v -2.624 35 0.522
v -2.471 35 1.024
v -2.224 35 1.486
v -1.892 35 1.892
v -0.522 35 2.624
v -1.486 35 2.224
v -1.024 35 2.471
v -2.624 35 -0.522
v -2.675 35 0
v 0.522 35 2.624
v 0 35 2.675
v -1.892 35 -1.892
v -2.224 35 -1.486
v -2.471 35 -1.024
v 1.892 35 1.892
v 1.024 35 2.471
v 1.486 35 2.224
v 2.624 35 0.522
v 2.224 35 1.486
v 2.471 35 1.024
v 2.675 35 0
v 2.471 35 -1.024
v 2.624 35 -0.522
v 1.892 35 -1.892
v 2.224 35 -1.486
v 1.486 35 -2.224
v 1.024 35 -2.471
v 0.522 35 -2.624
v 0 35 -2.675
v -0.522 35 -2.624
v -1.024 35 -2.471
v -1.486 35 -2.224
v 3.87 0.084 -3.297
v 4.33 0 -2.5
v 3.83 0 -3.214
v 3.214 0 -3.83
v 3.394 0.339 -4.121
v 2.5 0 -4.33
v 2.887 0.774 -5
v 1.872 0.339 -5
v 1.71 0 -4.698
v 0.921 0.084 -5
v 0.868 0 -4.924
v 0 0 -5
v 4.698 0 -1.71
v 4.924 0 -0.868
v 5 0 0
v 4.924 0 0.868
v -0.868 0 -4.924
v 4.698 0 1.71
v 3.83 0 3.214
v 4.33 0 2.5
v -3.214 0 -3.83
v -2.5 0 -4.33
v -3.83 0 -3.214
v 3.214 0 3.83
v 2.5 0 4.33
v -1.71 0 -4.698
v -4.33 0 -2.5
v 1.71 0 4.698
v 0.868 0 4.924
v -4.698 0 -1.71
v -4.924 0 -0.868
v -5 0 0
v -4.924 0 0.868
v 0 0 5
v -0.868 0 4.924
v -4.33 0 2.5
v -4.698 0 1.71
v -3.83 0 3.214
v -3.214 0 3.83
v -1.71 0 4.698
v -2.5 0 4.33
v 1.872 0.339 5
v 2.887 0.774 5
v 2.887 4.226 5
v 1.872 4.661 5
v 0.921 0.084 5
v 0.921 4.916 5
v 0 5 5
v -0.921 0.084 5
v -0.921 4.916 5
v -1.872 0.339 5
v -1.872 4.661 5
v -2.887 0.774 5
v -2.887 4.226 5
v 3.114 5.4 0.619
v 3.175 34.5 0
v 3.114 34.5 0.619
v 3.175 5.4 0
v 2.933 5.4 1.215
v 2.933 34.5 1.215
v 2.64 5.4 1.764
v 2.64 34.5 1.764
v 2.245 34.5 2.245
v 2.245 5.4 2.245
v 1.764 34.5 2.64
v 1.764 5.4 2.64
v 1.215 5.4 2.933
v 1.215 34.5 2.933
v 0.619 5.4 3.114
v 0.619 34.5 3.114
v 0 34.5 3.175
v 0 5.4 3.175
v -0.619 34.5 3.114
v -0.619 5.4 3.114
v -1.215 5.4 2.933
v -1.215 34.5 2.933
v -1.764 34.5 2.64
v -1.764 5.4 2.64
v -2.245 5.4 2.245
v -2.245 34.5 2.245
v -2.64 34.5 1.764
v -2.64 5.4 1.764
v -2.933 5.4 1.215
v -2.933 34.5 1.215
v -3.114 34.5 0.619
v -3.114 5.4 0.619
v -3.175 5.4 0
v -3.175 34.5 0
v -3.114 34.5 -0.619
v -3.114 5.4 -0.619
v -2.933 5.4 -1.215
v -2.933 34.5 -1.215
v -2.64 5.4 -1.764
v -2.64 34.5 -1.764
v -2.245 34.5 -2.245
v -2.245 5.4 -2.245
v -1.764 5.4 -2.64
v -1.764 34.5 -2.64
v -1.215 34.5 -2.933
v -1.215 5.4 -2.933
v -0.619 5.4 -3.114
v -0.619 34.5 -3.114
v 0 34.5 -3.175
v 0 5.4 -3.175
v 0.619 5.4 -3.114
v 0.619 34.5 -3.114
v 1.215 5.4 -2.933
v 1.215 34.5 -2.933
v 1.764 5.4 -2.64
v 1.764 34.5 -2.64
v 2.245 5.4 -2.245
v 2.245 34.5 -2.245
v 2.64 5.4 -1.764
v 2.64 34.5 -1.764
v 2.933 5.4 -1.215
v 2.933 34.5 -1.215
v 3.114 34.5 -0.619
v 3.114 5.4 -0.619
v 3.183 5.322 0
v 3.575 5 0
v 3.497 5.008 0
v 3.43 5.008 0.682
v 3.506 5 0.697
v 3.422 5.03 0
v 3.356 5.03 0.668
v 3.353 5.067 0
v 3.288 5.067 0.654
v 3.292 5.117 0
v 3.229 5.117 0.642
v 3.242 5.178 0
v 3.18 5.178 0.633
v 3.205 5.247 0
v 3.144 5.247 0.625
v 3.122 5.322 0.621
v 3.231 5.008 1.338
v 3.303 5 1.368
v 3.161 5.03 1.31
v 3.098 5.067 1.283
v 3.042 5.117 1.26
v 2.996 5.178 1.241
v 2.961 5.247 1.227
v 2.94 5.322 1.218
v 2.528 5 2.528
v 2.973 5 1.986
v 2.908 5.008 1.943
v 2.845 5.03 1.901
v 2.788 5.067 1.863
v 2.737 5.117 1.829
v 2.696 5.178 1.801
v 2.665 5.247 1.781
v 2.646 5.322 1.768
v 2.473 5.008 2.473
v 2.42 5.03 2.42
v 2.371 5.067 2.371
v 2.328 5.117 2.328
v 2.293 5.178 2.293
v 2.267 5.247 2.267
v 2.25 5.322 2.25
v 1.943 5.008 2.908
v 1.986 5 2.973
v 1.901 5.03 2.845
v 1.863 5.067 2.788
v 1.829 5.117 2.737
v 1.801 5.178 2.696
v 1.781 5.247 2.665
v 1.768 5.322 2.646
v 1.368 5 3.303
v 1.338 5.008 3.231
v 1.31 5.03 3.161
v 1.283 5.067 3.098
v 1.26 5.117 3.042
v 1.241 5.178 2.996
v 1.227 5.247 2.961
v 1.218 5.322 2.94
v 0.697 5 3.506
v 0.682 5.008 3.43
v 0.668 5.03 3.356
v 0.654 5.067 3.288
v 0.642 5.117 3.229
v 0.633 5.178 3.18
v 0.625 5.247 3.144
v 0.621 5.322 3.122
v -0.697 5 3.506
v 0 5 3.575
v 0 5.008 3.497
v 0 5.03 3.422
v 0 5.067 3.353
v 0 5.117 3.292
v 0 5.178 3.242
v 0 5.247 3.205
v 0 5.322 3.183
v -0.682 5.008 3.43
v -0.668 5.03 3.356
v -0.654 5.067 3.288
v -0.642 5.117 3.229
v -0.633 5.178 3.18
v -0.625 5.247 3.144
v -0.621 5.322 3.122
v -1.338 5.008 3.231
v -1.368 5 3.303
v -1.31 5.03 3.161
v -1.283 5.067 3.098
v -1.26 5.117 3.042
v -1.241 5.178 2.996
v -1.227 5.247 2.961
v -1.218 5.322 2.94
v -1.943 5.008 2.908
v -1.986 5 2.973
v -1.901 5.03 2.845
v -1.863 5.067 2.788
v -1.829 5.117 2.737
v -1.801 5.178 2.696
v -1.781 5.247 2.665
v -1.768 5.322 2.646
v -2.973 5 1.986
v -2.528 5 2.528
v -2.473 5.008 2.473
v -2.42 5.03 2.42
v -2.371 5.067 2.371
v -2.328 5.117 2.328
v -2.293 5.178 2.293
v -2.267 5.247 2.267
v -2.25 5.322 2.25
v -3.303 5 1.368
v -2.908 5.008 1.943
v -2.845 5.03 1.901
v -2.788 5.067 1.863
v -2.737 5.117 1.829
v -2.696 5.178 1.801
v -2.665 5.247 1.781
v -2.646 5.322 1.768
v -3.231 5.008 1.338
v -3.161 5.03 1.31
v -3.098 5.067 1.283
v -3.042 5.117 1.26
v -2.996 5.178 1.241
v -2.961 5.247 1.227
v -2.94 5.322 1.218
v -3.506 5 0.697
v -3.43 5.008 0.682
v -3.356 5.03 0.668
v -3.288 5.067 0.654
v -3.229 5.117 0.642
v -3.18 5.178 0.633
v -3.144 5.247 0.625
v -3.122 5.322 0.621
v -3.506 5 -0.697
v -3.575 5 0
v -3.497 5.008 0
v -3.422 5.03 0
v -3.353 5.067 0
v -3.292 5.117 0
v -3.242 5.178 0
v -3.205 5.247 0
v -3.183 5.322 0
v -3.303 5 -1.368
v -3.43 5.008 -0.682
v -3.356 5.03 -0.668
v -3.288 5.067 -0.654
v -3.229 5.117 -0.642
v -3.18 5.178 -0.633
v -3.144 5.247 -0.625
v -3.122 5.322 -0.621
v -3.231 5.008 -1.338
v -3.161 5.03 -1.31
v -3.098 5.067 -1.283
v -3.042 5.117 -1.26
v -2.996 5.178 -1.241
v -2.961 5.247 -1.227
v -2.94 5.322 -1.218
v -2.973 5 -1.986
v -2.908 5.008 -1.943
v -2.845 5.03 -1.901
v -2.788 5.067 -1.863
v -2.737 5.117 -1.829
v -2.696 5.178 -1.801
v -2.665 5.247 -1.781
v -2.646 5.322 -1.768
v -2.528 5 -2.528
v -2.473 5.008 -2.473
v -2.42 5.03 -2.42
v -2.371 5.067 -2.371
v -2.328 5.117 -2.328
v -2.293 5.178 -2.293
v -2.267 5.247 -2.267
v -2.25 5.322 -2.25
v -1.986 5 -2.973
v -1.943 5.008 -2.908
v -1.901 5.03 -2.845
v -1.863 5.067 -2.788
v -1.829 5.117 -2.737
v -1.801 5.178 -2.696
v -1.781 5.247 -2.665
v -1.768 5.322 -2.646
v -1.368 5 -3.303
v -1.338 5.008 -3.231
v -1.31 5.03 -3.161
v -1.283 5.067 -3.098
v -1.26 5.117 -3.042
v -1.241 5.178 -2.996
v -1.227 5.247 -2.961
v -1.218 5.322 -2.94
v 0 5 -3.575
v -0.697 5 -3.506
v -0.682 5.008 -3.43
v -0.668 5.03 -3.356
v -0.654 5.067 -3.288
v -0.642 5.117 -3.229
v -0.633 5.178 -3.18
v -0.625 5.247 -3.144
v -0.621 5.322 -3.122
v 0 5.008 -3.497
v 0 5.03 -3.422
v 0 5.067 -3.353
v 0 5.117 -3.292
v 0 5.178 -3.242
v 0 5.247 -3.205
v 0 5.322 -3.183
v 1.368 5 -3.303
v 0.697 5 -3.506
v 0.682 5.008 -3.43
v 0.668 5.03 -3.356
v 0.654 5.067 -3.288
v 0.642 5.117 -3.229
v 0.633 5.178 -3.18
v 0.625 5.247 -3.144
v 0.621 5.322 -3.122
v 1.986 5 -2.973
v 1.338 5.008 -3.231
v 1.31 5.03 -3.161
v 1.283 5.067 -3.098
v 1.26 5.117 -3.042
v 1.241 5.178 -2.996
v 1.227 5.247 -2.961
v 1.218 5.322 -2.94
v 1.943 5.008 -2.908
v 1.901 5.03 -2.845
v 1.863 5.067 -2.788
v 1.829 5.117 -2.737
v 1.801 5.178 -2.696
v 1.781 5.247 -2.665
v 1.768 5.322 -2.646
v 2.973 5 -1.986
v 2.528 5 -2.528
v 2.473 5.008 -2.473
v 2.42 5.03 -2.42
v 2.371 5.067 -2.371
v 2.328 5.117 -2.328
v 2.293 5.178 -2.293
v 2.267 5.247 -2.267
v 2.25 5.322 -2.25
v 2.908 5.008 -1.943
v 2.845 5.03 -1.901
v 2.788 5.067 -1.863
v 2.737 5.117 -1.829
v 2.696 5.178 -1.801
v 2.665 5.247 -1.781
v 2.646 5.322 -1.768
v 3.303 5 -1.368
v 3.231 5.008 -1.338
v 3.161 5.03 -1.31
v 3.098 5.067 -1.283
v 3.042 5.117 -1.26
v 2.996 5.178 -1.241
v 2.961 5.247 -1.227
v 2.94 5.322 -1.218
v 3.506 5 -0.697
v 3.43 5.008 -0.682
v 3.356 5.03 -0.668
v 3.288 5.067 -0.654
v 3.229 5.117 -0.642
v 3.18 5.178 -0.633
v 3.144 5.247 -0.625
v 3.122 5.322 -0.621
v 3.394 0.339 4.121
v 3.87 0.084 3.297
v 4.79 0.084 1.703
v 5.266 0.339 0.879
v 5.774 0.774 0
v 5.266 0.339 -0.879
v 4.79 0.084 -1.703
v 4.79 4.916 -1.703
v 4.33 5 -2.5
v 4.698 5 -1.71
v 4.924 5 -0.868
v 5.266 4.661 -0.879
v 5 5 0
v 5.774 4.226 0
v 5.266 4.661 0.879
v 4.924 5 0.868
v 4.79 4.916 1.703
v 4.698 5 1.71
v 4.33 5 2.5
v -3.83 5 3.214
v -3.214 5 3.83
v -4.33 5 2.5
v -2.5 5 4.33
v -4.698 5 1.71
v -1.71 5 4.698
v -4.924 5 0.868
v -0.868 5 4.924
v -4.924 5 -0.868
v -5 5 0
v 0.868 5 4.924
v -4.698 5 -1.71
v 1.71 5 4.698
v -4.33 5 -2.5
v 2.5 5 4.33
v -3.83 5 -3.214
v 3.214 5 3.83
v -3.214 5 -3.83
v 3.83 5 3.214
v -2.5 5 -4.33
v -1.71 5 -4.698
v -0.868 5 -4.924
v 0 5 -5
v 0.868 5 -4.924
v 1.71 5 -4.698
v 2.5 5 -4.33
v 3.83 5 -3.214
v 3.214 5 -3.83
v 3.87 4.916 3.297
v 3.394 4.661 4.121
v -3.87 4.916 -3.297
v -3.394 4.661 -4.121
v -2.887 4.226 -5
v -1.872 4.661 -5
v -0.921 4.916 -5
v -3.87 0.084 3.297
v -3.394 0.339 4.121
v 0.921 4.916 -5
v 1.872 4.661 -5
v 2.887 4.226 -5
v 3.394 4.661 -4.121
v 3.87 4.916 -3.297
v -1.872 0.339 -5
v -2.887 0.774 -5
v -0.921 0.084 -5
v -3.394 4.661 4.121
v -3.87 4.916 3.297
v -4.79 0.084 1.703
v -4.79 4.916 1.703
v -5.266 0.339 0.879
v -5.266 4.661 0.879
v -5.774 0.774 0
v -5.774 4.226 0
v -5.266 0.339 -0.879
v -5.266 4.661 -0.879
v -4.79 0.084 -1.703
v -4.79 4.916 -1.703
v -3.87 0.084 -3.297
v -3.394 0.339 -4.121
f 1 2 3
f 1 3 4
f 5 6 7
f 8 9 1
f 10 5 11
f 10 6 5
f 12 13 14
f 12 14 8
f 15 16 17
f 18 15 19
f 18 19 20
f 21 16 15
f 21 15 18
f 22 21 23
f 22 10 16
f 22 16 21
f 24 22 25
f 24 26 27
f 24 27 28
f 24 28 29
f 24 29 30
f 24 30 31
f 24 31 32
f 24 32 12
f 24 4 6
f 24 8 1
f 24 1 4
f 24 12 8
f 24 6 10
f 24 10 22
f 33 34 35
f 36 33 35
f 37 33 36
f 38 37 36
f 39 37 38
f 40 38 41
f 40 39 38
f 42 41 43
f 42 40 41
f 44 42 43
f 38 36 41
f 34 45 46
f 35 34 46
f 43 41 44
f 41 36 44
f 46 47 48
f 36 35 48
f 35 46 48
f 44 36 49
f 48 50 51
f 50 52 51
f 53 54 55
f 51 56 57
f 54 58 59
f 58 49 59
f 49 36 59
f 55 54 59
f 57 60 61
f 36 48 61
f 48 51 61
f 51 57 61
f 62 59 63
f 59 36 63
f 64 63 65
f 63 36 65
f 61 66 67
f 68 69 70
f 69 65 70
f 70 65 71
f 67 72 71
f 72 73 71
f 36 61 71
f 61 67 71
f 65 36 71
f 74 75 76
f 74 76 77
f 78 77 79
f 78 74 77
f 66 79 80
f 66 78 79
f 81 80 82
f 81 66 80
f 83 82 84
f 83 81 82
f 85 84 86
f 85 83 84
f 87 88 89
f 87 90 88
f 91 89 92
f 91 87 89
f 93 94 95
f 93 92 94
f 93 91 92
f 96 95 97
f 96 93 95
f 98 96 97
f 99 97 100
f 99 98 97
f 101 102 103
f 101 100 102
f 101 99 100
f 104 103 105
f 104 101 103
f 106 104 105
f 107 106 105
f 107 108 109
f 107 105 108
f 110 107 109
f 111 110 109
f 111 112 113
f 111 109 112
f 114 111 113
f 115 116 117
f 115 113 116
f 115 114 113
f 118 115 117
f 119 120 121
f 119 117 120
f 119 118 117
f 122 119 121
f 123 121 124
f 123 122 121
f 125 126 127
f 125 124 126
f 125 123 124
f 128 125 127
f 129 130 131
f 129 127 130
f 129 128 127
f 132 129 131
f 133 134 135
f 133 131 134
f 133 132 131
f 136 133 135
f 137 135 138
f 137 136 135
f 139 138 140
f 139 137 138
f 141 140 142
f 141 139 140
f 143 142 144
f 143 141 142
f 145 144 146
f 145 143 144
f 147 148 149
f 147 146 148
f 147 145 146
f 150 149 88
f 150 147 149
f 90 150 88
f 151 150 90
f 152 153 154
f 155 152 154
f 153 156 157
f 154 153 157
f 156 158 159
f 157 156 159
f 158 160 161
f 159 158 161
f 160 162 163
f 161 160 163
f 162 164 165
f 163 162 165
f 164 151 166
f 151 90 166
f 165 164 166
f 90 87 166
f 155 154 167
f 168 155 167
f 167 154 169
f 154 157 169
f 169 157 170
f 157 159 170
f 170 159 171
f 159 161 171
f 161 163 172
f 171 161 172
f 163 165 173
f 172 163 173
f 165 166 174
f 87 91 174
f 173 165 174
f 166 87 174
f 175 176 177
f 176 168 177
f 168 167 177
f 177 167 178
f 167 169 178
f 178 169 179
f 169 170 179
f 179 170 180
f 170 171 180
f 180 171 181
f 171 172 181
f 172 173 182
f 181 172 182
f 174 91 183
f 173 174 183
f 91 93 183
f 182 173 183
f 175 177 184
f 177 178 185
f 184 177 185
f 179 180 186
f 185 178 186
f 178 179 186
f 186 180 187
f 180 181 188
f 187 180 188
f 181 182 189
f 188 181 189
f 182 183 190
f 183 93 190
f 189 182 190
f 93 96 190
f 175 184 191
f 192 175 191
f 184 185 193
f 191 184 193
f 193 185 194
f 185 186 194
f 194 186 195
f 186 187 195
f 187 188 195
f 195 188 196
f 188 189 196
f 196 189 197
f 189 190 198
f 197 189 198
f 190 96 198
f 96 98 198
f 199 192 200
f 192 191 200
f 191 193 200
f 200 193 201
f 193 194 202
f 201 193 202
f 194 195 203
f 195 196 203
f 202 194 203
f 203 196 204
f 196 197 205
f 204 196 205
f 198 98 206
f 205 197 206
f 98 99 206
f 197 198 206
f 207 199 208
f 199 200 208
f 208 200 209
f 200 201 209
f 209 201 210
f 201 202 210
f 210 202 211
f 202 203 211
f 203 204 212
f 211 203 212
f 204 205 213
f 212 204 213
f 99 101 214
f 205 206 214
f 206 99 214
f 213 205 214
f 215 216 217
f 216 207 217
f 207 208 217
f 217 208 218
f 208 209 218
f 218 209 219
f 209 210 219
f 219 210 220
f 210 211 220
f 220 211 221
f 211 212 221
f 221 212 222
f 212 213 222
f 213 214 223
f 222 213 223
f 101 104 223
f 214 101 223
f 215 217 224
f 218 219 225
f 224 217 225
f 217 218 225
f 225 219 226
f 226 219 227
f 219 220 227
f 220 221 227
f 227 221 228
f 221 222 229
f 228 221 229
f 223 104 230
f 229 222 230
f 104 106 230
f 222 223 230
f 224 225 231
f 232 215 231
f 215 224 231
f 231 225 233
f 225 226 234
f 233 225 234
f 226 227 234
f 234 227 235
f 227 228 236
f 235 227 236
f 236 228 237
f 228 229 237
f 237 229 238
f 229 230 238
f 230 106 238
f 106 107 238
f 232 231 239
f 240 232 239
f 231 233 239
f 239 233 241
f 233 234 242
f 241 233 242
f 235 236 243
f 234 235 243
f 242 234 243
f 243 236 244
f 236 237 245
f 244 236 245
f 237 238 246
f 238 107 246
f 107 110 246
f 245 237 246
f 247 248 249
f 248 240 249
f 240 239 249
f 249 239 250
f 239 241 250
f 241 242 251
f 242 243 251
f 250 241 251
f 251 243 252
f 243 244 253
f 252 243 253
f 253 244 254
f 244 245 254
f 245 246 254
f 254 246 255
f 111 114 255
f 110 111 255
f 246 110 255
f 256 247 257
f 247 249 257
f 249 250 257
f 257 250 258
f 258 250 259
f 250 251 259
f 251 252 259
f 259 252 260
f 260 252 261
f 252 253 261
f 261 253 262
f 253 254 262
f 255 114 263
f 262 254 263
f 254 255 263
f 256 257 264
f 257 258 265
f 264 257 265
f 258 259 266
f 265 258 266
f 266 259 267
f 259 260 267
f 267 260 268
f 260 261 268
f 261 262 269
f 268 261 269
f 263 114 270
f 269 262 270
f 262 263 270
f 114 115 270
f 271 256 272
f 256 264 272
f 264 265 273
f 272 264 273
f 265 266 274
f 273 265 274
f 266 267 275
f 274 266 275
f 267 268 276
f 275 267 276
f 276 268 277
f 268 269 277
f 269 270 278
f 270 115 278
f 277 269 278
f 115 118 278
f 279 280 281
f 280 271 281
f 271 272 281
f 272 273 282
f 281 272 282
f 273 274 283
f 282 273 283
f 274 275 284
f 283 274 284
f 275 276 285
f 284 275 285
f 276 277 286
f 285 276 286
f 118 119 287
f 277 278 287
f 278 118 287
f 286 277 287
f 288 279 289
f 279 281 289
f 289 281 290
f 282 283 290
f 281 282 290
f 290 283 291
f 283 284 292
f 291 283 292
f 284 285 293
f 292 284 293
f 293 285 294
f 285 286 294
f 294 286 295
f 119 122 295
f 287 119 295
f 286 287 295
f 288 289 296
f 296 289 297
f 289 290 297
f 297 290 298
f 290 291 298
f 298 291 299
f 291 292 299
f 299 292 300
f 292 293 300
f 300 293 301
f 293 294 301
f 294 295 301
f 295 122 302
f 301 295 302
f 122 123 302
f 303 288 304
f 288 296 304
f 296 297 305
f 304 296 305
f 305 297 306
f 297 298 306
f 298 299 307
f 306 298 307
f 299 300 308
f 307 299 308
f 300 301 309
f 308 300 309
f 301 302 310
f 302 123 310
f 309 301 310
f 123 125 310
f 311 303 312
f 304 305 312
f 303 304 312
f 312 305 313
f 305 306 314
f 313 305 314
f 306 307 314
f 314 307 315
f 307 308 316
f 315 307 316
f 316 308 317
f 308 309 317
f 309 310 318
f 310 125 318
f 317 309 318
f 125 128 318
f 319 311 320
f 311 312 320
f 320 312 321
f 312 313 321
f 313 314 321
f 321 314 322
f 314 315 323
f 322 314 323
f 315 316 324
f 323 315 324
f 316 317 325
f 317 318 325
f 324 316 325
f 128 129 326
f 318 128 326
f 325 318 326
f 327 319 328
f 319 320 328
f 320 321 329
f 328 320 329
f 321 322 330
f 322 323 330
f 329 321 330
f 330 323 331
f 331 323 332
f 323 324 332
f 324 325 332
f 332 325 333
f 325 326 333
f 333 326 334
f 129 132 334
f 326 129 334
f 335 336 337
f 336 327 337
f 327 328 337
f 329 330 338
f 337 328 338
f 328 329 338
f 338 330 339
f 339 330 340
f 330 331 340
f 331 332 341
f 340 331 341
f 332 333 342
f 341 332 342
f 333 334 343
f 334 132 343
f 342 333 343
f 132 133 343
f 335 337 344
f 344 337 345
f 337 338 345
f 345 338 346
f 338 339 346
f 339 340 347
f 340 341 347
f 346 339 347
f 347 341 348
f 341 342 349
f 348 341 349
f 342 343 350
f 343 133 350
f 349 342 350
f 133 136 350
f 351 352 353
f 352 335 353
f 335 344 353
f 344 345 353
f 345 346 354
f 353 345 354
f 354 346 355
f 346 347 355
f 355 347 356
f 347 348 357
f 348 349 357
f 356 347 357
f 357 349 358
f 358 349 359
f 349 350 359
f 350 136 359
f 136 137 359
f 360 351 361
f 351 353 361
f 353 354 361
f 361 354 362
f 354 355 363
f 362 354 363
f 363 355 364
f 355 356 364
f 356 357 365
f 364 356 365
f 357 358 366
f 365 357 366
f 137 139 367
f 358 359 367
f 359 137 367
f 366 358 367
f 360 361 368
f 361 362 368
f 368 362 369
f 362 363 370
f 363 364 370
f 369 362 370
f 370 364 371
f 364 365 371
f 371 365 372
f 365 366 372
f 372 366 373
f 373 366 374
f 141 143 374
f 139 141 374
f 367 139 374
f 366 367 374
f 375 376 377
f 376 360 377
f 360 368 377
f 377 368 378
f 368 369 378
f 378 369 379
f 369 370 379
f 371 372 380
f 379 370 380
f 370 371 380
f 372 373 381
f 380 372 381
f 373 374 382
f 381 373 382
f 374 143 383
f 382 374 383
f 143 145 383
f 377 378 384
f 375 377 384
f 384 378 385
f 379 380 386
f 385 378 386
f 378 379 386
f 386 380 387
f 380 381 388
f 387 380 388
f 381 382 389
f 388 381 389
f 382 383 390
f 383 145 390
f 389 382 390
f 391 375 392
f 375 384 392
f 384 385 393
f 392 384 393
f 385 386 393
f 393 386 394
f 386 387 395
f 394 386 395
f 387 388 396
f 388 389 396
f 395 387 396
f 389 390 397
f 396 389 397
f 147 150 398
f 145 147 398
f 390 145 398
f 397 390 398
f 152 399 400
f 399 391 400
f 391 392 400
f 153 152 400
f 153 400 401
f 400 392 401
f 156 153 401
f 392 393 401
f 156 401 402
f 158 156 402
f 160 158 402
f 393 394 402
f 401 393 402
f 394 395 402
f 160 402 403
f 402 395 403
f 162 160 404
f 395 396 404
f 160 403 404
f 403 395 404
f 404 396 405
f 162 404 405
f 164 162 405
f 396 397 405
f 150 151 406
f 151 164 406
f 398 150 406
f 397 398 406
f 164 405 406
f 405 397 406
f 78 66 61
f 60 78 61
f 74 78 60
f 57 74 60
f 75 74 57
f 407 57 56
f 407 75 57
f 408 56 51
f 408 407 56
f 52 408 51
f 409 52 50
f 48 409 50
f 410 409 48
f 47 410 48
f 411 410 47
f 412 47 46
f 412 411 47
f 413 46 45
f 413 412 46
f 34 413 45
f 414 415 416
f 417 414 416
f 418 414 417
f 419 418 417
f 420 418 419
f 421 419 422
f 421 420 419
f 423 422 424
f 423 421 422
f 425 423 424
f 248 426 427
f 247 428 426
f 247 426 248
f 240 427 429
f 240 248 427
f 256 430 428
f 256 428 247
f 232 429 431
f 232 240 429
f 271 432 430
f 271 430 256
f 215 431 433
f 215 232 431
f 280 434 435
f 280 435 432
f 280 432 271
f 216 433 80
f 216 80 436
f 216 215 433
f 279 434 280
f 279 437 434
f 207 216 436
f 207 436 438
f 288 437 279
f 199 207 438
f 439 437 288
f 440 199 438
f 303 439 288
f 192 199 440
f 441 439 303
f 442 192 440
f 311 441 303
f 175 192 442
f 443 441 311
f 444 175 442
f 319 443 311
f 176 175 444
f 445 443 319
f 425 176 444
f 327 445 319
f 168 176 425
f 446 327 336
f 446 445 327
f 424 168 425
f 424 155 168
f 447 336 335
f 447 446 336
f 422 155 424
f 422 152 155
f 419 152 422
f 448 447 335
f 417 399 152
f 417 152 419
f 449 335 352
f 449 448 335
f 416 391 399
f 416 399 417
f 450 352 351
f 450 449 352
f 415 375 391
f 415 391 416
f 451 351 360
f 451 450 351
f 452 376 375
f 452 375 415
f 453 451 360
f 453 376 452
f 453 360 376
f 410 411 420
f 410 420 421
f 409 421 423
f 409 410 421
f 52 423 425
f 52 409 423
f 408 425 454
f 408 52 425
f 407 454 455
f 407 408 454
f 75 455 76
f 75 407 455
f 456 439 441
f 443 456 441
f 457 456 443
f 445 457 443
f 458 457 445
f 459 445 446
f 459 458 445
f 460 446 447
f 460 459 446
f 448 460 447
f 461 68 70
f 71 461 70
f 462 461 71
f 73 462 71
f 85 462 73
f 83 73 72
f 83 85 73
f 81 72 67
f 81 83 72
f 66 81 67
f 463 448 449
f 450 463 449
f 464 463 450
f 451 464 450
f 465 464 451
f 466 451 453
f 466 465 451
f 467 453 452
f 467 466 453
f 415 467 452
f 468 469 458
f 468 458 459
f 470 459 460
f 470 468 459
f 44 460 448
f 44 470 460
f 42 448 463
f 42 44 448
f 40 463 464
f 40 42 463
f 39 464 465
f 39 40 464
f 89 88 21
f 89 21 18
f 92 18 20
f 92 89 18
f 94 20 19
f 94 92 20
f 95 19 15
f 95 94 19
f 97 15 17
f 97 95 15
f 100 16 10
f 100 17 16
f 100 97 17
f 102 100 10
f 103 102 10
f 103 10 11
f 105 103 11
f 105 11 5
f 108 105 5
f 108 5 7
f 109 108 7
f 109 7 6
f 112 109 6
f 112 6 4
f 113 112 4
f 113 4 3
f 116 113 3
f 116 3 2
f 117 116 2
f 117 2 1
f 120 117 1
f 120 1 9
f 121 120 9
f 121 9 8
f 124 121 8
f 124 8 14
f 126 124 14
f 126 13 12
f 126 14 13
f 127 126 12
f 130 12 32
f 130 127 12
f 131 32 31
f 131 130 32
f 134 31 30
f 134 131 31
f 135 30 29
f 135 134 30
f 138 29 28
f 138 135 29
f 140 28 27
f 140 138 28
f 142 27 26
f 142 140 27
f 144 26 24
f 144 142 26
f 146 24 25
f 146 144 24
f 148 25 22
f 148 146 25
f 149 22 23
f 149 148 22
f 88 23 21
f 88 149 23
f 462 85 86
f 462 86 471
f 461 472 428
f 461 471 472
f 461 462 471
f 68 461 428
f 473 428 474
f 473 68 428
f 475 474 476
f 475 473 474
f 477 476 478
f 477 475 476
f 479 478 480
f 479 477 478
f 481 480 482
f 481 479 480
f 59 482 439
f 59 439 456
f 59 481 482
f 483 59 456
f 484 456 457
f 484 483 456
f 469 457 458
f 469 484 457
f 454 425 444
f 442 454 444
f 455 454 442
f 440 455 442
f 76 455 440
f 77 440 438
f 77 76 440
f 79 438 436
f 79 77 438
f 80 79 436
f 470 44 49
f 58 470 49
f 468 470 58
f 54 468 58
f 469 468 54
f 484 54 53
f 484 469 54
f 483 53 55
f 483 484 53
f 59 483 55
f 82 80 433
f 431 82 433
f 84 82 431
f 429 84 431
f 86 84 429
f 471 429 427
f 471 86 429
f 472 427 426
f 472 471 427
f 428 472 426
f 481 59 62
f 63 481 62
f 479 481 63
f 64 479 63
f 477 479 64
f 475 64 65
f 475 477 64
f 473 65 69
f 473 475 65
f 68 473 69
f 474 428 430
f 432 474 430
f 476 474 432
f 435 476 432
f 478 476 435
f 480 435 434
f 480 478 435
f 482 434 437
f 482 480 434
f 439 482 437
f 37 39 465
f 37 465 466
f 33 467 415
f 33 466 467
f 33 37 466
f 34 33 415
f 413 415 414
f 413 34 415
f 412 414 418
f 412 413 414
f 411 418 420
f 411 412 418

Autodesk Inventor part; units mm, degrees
ref_plane "YZ Plane" through (0, 0, 0) normal (1, 0, 0) x (0, 1, 0)
ref_plane "XZ Plane" through (0, 0, 0) normal (0, 1, 0) x (-1, 0, 0)
ref_plane "XY Plane" through (0, 0, 0) normal (0, 0, 1) x (1, 0, 0)
sketch "Esboço1" plane through (0, 0, 0) normal (0, 1, 0) x (-1, 0, 0)
  circle A0 centre (0, 0) radius 3
  line L0 (-2.8868, -5) -> (-5.7735, 0)
  line L1 (-5.7735, 0) -> (-2.8868, 5)
  line L2 (-2.8868, 5) -> (2.8868, 5)
  line L3 (2.8868, 5) -> (5.7735, 0)
  line L4 (5.7735, 0) -> (2.8868, -5)
  line L5 (2.8868, -5) -> (-2.8868, -5)
  dimension "d0" = 6
extrude "Extrusão1" add sketch "Esboço1" along normal blind 5
sketch "Esboço2" plane through (0, 0, 0) normal (1, 0, 0) x (0, 1, 0)
  point P0 (0, 0)
chamfer "Chanfro1" distance 0.5 angle 45 2 edges at (3, 0, 0) (3, 5, 0)
sketch "Esboço5" plane through (0, 0, 0) normal (0, -1, 0) x (1, 0, 0)
  circle A0 centre (0, 0) radius 5
extrude "Extrusão2" cut sketch "Esboço5" against normal through all draft 45 keep common part
sketch "Esboço6" plane through (0, 5, 0) normal (0, 1, 0) x (1, 0, 0)
  circle A0 centre (0, 0) radius 5
extrude "Extrusão3" cut sketch "Esboço6" against normal through all draft 45 keep common part
sketch "Esboço7" plane through (0, 5, 0) normal (0, 1, 0) x (1, 0, 0)
  circle A0 centre (0, 0) radius 3.5
extrude "Extrusão4" add sketch "Esboço7" against normal blind 5
sketch "Esboço8" plane through (0, 5, 0) normal (0, 1, 0) x (1, 0, 0)
  circle A0 centre (0, 0) radius 3.175
  dimension "d16" = 6.35
extrude "Extrusão5" add sketch "Esboço8" along normal blind 30
fillet "Arredondamento2" radius 0.4 1 edges at (-3.175, 5, 0)
chamfer "Chanfro3" distance 0.5 angle 45 1 edges at (-3.175, 35, 0)
thread "Rosca3" size "1/4-20 UNC" class "2A" standard "ANSI Unified Screw Threads" full length
properties part number "Parafuso sextavado 1 quarto 30mm" material "Aço inoxidável"
